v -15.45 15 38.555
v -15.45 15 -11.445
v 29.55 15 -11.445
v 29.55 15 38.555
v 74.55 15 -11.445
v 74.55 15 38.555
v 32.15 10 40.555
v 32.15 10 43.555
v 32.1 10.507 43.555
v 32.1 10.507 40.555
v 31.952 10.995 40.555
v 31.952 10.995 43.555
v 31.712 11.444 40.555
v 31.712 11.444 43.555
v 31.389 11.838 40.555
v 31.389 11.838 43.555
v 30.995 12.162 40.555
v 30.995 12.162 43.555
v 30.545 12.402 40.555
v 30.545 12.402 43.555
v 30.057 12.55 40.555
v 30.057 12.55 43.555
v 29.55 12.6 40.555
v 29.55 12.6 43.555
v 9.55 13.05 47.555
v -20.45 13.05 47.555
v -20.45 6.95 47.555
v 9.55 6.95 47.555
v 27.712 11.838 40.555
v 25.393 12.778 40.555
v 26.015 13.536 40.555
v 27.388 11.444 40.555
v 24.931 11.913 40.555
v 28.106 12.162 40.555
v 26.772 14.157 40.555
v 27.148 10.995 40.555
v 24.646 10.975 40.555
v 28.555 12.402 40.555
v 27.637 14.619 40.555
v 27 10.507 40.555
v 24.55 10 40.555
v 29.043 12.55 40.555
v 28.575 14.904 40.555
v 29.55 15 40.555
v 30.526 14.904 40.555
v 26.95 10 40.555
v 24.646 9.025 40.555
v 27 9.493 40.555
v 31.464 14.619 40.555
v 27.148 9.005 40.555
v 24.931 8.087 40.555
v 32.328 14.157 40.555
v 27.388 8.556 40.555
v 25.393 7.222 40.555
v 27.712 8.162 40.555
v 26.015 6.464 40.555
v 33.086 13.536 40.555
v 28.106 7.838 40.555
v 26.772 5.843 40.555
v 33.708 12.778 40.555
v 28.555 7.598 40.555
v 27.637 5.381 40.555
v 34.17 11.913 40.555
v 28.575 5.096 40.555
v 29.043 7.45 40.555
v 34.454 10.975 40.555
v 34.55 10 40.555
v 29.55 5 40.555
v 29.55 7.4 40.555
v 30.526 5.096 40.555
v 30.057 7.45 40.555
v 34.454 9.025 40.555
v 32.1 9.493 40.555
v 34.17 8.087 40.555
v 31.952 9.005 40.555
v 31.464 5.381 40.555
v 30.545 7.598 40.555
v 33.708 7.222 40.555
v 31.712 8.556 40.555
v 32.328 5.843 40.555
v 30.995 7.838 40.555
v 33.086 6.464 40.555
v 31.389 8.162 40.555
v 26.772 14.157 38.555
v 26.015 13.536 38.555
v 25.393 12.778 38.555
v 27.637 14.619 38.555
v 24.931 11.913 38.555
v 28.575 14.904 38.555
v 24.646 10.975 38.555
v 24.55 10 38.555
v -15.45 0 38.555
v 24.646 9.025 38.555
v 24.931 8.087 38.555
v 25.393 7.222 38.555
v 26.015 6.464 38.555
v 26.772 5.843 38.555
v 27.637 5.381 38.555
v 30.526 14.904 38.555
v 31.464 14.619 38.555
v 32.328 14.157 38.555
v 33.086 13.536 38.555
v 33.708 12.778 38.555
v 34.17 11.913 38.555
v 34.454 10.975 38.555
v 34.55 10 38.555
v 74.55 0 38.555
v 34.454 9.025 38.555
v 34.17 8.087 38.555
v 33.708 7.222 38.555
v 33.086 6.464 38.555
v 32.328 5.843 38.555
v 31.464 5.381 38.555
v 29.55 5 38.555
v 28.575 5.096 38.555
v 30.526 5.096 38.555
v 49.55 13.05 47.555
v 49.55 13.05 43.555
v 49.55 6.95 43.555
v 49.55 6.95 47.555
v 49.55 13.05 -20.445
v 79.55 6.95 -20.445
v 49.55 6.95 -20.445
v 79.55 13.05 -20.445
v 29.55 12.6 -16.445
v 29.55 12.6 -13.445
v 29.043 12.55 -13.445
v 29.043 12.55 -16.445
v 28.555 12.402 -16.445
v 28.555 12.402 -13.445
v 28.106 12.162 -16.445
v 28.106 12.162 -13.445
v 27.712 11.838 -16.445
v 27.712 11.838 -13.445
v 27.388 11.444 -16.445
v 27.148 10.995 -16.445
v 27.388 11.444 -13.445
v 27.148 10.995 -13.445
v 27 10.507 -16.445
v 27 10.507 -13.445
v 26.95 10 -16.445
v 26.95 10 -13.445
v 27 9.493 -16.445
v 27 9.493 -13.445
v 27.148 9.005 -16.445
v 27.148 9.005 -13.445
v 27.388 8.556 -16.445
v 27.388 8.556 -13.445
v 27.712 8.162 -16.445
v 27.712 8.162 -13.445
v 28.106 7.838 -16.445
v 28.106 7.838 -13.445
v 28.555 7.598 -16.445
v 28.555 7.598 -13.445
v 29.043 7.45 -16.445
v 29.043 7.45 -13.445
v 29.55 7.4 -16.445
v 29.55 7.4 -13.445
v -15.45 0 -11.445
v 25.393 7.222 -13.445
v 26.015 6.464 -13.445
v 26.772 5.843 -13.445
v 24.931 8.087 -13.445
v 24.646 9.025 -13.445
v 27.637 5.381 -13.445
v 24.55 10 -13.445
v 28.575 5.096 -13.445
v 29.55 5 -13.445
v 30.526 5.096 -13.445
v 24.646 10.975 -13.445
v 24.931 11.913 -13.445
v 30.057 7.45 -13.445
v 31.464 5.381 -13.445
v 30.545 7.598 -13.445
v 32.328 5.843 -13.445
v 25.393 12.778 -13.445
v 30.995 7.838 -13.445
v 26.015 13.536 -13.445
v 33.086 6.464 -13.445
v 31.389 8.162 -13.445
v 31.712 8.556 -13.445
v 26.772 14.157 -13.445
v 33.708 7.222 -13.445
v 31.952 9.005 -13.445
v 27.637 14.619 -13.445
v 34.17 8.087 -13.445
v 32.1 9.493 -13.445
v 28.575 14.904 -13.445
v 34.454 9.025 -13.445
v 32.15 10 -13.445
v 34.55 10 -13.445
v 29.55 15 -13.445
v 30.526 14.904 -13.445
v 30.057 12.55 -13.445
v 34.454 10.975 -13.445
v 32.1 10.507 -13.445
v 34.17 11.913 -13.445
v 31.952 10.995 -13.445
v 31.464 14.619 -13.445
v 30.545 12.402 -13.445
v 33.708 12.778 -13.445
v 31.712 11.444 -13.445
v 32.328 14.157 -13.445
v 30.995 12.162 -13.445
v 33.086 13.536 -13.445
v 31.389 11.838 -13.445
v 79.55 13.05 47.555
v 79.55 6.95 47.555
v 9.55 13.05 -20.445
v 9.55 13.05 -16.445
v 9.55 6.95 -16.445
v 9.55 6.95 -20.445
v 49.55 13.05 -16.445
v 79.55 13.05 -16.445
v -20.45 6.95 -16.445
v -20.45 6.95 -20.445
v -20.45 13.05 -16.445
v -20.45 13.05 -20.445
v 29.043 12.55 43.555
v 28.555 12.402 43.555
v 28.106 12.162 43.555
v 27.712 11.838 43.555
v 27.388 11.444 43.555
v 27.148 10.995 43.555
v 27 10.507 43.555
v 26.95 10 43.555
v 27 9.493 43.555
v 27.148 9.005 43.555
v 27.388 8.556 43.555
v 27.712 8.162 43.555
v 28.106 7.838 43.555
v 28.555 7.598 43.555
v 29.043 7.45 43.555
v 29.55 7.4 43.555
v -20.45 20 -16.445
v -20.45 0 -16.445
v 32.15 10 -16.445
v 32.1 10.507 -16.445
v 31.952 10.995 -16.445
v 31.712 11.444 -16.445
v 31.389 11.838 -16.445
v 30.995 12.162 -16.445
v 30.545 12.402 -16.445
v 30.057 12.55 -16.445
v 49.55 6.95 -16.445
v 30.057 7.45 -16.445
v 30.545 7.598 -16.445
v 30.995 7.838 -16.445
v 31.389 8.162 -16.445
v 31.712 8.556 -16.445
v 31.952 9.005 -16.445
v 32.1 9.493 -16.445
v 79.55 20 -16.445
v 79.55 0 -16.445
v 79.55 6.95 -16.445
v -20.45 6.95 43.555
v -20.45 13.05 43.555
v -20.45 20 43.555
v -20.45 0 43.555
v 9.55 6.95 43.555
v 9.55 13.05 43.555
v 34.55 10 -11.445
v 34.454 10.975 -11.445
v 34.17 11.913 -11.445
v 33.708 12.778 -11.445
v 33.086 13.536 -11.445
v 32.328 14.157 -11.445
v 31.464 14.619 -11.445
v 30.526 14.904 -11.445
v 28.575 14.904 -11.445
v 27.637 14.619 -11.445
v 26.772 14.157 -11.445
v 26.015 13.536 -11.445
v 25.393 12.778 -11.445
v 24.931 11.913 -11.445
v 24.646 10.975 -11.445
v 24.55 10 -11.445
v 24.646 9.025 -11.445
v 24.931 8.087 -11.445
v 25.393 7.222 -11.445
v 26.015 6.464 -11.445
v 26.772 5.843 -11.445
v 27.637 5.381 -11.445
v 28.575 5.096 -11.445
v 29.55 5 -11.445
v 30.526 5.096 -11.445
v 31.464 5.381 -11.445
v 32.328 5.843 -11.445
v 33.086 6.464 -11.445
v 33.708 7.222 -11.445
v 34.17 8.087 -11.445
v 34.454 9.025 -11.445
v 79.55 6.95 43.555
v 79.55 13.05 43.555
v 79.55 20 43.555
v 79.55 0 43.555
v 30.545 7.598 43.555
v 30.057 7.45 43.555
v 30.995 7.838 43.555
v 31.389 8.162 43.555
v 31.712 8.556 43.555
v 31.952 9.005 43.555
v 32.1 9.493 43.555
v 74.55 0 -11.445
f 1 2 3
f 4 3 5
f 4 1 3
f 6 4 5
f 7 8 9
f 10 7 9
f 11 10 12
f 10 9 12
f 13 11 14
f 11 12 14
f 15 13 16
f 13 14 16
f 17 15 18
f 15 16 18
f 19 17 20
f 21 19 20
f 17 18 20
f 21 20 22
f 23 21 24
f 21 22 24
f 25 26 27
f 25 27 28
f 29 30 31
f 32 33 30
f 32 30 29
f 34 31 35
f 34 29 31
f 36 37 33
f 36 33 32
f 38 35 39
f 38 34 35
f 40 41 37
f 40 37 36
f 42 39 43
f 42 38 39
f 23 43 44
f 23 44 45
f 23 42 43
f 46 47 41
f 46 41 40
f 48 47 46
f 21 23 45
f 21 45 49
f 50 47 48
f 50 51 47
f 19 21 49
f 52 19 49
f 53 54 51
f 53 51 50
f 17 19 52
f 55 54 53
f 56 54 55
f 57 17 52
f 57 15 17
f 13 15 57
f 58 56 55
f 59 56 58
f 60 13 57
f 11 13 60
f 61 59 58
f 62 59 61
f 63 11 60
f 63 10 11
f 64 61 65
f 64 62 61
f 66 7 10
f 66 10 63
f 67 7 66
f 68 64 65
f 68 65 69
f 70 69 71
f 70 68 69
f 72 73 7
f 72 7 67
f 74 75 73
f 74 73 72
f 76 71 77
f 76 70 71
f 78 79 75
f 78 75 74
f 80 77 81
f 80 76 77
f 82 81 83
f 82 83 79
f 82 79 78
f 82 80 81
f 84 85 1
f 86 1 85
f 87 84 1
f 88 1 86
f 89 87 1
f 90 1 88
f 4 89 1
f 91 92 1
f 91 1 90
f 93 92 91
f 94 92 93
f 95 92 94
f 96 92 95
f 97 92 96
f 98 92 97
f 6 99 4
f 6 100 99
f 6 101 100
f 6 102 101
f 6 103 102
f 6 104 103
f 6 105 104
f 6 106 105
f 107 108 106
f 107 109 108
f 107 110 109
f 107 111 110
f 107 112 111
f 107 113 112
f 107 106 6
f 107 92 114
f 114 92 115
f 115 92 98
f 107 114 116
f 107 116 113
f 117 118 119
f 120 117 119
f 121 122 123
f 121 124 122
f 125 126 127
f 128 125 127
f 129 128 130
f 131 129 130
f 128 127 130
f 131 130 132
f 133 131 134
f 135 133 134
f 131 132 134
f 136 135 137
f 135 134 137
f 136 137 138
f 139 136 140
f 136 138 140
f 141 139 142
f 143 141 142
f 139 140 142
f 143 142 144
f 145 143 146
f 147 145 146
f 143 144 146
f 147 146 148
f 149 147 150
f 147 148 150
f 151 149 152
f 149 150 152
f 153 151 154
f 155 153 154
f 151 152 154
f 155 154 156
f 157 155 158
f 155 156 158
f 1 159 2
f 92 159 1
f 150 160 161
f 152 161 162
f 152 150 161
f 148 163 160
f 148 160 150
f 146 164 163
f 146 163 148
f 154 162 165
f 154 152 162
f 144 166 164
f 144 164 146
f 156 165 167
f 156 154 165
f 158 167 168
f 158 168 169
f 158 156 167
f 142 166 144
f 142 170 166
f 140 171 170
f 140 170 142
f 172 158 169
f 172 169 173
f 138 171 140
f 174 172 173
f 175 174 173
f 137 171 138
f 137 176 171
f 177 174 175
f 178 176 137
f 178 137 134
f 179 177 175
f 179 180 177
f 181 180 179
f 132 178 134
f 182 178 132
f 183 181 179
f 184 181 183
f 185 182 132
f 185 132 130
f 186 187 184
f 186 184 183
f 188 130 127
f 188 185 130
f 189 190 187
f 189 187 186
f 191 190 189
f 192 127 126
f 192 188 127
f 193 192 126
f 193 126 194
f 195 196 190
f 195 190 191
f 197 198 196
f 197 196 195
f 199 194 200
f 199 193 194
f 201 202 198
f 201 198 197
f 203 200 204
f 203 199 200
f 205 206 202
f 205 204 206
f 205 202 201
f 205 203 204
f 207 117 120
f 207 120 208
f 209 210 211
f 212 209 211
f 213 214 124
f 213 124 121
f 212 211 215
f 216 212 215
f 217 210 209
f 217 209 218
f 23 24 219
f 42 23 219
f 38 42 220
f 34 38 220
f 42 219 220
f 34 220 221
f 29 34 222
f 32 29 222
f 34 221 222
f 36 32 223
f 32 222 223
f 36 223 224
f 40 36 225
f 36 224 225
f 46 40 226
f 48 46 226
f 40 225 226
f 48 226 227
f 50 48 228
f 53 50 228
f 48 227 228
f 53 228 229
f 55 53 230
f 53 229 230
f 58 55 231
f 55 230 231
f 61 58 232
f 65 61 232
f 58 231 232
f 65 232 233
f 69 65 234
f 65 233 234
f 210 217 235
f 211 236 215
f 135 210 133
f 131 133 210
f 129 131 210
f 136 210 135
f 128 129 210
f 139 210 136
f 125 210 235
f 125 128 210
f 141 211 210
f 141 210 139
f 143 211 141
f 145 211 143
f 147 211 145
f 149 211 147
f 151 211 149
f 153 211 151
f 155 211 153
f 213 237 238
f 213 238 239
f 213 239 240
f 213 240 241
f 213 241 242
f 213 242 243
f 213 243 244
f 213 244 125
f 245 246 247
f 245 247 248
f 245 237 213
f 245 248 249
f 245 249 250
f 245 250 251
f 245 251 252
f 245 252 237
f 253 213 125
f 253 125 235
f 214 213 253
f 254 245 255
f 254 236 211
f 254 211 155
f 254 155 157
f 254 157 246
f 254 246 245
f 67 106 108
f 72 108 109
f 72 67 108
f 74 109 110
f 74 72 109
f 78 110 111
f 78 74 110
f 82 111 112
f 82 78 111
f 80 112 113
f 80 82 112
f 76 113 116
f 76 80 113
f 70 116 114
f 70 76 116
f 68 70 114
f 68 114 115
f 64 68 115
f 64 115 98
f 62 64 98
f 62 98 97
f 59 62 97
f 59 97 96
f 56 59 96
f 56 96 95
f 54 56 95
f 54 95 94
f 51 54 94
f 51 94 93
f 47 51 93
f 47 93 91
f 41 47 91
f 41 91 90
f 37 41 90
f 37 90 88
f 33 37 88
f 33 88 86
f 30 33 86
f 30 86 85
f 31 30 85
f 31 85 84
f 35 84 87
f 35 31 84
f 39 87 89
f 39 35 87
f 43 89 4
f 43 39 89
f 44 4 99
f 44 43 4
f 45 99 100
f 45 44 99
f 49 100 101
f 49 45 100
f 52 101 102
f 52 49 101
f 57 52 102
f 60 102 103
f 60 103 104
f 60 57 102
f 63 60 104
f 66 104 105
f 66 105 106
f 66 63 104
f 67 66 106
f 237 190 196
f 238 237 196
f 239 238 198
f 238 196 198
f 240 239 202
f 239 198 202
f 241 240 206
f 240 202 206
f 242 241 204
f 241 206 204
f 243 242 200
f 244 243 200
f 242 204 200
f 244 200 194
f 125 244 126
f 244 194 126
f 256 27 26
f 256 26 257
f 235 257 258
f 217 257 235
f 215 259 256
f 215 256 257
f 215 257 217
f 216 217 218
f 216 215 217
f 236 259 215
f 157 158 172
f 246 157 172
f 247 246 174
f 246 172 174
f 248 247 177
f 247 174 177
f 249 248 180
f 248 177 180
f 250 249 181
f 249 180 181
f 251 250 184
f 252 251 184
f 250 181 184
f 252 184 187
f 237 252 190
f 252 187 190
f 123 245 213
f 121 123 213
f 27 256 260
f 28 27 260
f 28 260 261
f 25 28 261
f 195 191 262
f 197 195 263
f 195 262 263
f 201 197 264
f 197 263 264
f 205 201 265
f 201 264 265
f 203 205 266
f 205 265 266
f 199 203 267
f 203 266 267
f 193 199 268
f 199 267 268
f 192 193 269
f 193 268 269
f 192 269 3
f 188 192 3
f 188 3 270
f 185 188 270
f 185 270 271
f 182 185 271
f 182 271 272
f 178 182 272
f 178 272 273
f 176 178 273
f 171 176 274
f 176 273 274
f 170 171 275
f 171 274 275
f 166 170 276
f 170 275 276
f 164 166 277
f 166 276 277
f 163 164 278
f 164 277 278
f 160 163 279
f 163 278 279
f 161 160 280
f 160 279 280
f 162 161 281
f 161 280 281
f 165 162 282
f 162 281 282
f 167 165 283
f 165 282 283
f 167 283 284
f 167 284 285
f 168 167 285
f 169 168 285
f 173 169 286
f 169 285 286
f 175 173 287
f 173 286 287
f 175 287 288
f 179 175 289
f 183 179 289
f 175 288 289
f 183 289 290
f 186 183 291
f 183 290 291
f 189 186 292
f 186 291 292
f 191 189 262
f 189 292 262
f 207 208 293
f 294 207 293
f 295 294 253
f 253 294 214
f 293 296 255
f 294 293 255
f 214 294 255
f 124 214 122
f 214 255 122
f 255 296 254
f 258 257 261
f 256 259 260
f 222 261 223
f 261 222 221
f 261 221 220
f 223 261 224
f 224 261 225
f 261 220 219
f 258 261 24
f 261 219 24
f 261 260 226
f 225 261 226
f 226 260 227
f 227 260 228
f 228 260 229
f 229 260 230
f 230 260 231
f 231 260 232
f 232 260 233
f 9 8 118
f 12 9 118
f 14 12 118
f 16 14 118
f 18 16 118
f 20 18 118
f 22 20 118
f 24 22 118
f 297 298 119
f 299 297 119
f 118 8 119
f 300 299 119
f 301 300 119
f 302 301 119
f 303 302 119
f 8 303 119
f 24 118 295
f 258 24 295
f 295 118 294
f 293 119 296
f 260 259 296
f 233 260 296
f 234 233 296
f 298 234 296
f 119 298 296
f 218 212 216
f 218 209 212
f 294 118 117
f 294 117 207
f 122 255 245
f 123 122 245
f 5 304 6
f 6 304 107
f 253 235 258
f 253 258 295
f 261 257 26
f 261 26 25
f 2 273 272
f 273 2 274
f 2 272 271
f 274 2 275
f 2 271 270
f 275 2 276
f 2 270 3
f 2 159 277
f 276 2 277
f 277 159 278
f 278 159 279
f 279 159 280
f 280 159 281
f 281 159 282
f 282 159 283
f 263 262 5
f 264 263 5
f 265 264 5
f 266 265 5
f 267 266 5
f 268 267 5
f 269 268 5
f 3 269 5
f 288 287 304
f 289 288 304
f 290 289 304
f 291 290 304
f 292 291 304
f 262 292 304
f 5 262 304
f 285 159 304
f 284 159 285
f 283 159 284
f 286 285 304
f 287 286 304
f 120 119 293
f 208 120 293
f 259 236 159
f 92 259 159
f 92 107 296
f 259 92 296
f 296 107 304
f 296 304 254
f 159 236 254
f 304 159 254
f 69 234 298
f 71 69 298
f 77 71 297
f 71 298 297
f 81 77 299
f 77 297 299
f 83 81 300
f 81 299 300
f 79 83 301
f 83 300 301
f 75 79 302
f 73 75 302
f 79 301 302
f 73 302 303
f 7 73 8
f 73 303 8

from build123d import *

# Parameters (mm, degrees)
SKETCH_1_W          = 100
SKETCH_1_H          = 60
EXTRUDE_1_DEPTH     = 20
SKETCH_2_W          = 90
SKETCH_2_H          = 50
CUT_EXTRUDE_1_DEPTH = 15
CUT_EXTRUDE_6_DEPTH = 200
SKETCH_9_R          = 5
CUT_EXTRUDE_7_DEPTH = 2
CUT_EXTRUDE_START   = -2
SKETCH_10_R         = 5
CUT_EXTRUDE_8_DEPTH = 2
SKETCH_11_W         = 30
SKETCH_11_H         = 3.05
EXTRUDE_2_DEPTH     = 4
SKETCH_12_W         = 30
SKETCH_12_H         = 3.05
EXTRUDE_3_DEPTH     = 4


with BuildPart() as part:
    # 草图1 → 凸台-拉伸1 (new body)
    with BuildSketch(Plane(origin=(0, 0, 0), x_dir=(1, 0, 0), z_dir=(0, 1, 0))):
        with Locations((29.550198358, -13.555421679)):
            Rectangle(SKETCH_1_W, SKETCH_1_H)
    extrude(amount=EXTRUDE_1_DEPTH)

    # 草图2 → 切除-拉伸1 (cut)
    with BuildSketch(Plane.XZ):
        with Locations((29.550198358, 13.555421679)):
            Rectangle(SKETCH_2_W, SKETCH_2_H)
    extrude(amount=-CUT_EXTRUDE_1_DEPTH, mode=Mode.SUBTRACT)

    # 草图8 → 切除-拉伸6 (cut)
    with BuildSketch(Plane.XY.offset(43.555421679)):
        with BuildLine():
            ThreePointArc((32.150198358, 10), (31.388675989, 11.838477631), (29.550198358, 12.6))
            Line((29.550198358, 12.6), (29.550198358, 7.4))
            ThreePointArc((29.550198358, 7.4), (31.388675989, 8.161522369), (32.150198358, 10))
        make_face()
        with BuildLine():
            Line((29.550198358, 7.4), (29.550198358, 12.6))
            ThreePointArc((29.550198358, 12.6), (26.950198358, 10), (29.550198358, 7.4))
        make_face()
    extrude(amount=-CUT_EXTRUDE_6_DEPTH, mode=Mode.SUBTRACT)

    # 草图9 → 切除-拉伸7 (cut)
    with BuildSketch(Plane.XY.offset(-11.444578321)):
        with Locations((29.550198358, 10)):
            Circle(SKETCH_9_R)
    extrude(amount=-CUT_EXTRUDE_7_DEPTH, mode=Mode.SUBTRACT)

    # 草图10 → 切除-拉伸8 (cut)
    with BuildSketch(Plane(origin=(0, 0, 38.555421679), x_dir=(-1, 0, 0), z_dir=(0, 0, -1)).offset(CUT_EXTRUDE_START)):
        with Locations(Location((-29.550198358, 10, 0), (0, 0, 180))):
            Circle(SKETCH_10_R)
    extrude(amount=CUT_EXTRUDE_8_DEPTH, mode=Mode.SUBTRACT)

    # 草图11 → 凸台-拉伸2 (add)
    with BuildSketch(Plane(origin=(0, 0, -16.444578321), x_dir=(-1, 0, 0), z_dir=(0, 0, -1))):
        with Locations((5.449801642, 8.475)):
            Rectangle(SKETCH_11_W, SKETCH_11_H)
        with Locations((5.449801642, 11.525)):
            Rectangle(SKETCH_11_W, SKETCH_11_H)
        with Locations((-64.550198358, 8.475)):
            Rectangle(SKETCH_11_W, SKETCH_11_H)
        with Locations((-64.550198358, 11.525)):
            Rectangle(SKETCH_11_W, SKETCH_11_H)
    extrude(amount=EXTRUDE_2_DEPTH)

    # 草图12 → 凸台-拉伸3 (add)
    with BuildSketch(Plane.XY.offset(43.555421679)):
        with Locations((-5.449801642, 11.525)):
            Rectangle(SKETCH_12_W, SKETCH_12_H)
        with Locations((-5.449801642, 8.475)):
            Rectangle(SKETCH_12_W, SKETCH_12_H)
        with Locations((64.550198358, 11.525)):
            Rectangle(SKETCH_12_W, SKETCH_12_H)
        with Locations((64.550198358, 8.475)):
            Rectangle(SKETCH_12_W, SKETCH_12_H)
    extrude(amount=EXTRUDE_3_DEPTH)


solid = part.part
